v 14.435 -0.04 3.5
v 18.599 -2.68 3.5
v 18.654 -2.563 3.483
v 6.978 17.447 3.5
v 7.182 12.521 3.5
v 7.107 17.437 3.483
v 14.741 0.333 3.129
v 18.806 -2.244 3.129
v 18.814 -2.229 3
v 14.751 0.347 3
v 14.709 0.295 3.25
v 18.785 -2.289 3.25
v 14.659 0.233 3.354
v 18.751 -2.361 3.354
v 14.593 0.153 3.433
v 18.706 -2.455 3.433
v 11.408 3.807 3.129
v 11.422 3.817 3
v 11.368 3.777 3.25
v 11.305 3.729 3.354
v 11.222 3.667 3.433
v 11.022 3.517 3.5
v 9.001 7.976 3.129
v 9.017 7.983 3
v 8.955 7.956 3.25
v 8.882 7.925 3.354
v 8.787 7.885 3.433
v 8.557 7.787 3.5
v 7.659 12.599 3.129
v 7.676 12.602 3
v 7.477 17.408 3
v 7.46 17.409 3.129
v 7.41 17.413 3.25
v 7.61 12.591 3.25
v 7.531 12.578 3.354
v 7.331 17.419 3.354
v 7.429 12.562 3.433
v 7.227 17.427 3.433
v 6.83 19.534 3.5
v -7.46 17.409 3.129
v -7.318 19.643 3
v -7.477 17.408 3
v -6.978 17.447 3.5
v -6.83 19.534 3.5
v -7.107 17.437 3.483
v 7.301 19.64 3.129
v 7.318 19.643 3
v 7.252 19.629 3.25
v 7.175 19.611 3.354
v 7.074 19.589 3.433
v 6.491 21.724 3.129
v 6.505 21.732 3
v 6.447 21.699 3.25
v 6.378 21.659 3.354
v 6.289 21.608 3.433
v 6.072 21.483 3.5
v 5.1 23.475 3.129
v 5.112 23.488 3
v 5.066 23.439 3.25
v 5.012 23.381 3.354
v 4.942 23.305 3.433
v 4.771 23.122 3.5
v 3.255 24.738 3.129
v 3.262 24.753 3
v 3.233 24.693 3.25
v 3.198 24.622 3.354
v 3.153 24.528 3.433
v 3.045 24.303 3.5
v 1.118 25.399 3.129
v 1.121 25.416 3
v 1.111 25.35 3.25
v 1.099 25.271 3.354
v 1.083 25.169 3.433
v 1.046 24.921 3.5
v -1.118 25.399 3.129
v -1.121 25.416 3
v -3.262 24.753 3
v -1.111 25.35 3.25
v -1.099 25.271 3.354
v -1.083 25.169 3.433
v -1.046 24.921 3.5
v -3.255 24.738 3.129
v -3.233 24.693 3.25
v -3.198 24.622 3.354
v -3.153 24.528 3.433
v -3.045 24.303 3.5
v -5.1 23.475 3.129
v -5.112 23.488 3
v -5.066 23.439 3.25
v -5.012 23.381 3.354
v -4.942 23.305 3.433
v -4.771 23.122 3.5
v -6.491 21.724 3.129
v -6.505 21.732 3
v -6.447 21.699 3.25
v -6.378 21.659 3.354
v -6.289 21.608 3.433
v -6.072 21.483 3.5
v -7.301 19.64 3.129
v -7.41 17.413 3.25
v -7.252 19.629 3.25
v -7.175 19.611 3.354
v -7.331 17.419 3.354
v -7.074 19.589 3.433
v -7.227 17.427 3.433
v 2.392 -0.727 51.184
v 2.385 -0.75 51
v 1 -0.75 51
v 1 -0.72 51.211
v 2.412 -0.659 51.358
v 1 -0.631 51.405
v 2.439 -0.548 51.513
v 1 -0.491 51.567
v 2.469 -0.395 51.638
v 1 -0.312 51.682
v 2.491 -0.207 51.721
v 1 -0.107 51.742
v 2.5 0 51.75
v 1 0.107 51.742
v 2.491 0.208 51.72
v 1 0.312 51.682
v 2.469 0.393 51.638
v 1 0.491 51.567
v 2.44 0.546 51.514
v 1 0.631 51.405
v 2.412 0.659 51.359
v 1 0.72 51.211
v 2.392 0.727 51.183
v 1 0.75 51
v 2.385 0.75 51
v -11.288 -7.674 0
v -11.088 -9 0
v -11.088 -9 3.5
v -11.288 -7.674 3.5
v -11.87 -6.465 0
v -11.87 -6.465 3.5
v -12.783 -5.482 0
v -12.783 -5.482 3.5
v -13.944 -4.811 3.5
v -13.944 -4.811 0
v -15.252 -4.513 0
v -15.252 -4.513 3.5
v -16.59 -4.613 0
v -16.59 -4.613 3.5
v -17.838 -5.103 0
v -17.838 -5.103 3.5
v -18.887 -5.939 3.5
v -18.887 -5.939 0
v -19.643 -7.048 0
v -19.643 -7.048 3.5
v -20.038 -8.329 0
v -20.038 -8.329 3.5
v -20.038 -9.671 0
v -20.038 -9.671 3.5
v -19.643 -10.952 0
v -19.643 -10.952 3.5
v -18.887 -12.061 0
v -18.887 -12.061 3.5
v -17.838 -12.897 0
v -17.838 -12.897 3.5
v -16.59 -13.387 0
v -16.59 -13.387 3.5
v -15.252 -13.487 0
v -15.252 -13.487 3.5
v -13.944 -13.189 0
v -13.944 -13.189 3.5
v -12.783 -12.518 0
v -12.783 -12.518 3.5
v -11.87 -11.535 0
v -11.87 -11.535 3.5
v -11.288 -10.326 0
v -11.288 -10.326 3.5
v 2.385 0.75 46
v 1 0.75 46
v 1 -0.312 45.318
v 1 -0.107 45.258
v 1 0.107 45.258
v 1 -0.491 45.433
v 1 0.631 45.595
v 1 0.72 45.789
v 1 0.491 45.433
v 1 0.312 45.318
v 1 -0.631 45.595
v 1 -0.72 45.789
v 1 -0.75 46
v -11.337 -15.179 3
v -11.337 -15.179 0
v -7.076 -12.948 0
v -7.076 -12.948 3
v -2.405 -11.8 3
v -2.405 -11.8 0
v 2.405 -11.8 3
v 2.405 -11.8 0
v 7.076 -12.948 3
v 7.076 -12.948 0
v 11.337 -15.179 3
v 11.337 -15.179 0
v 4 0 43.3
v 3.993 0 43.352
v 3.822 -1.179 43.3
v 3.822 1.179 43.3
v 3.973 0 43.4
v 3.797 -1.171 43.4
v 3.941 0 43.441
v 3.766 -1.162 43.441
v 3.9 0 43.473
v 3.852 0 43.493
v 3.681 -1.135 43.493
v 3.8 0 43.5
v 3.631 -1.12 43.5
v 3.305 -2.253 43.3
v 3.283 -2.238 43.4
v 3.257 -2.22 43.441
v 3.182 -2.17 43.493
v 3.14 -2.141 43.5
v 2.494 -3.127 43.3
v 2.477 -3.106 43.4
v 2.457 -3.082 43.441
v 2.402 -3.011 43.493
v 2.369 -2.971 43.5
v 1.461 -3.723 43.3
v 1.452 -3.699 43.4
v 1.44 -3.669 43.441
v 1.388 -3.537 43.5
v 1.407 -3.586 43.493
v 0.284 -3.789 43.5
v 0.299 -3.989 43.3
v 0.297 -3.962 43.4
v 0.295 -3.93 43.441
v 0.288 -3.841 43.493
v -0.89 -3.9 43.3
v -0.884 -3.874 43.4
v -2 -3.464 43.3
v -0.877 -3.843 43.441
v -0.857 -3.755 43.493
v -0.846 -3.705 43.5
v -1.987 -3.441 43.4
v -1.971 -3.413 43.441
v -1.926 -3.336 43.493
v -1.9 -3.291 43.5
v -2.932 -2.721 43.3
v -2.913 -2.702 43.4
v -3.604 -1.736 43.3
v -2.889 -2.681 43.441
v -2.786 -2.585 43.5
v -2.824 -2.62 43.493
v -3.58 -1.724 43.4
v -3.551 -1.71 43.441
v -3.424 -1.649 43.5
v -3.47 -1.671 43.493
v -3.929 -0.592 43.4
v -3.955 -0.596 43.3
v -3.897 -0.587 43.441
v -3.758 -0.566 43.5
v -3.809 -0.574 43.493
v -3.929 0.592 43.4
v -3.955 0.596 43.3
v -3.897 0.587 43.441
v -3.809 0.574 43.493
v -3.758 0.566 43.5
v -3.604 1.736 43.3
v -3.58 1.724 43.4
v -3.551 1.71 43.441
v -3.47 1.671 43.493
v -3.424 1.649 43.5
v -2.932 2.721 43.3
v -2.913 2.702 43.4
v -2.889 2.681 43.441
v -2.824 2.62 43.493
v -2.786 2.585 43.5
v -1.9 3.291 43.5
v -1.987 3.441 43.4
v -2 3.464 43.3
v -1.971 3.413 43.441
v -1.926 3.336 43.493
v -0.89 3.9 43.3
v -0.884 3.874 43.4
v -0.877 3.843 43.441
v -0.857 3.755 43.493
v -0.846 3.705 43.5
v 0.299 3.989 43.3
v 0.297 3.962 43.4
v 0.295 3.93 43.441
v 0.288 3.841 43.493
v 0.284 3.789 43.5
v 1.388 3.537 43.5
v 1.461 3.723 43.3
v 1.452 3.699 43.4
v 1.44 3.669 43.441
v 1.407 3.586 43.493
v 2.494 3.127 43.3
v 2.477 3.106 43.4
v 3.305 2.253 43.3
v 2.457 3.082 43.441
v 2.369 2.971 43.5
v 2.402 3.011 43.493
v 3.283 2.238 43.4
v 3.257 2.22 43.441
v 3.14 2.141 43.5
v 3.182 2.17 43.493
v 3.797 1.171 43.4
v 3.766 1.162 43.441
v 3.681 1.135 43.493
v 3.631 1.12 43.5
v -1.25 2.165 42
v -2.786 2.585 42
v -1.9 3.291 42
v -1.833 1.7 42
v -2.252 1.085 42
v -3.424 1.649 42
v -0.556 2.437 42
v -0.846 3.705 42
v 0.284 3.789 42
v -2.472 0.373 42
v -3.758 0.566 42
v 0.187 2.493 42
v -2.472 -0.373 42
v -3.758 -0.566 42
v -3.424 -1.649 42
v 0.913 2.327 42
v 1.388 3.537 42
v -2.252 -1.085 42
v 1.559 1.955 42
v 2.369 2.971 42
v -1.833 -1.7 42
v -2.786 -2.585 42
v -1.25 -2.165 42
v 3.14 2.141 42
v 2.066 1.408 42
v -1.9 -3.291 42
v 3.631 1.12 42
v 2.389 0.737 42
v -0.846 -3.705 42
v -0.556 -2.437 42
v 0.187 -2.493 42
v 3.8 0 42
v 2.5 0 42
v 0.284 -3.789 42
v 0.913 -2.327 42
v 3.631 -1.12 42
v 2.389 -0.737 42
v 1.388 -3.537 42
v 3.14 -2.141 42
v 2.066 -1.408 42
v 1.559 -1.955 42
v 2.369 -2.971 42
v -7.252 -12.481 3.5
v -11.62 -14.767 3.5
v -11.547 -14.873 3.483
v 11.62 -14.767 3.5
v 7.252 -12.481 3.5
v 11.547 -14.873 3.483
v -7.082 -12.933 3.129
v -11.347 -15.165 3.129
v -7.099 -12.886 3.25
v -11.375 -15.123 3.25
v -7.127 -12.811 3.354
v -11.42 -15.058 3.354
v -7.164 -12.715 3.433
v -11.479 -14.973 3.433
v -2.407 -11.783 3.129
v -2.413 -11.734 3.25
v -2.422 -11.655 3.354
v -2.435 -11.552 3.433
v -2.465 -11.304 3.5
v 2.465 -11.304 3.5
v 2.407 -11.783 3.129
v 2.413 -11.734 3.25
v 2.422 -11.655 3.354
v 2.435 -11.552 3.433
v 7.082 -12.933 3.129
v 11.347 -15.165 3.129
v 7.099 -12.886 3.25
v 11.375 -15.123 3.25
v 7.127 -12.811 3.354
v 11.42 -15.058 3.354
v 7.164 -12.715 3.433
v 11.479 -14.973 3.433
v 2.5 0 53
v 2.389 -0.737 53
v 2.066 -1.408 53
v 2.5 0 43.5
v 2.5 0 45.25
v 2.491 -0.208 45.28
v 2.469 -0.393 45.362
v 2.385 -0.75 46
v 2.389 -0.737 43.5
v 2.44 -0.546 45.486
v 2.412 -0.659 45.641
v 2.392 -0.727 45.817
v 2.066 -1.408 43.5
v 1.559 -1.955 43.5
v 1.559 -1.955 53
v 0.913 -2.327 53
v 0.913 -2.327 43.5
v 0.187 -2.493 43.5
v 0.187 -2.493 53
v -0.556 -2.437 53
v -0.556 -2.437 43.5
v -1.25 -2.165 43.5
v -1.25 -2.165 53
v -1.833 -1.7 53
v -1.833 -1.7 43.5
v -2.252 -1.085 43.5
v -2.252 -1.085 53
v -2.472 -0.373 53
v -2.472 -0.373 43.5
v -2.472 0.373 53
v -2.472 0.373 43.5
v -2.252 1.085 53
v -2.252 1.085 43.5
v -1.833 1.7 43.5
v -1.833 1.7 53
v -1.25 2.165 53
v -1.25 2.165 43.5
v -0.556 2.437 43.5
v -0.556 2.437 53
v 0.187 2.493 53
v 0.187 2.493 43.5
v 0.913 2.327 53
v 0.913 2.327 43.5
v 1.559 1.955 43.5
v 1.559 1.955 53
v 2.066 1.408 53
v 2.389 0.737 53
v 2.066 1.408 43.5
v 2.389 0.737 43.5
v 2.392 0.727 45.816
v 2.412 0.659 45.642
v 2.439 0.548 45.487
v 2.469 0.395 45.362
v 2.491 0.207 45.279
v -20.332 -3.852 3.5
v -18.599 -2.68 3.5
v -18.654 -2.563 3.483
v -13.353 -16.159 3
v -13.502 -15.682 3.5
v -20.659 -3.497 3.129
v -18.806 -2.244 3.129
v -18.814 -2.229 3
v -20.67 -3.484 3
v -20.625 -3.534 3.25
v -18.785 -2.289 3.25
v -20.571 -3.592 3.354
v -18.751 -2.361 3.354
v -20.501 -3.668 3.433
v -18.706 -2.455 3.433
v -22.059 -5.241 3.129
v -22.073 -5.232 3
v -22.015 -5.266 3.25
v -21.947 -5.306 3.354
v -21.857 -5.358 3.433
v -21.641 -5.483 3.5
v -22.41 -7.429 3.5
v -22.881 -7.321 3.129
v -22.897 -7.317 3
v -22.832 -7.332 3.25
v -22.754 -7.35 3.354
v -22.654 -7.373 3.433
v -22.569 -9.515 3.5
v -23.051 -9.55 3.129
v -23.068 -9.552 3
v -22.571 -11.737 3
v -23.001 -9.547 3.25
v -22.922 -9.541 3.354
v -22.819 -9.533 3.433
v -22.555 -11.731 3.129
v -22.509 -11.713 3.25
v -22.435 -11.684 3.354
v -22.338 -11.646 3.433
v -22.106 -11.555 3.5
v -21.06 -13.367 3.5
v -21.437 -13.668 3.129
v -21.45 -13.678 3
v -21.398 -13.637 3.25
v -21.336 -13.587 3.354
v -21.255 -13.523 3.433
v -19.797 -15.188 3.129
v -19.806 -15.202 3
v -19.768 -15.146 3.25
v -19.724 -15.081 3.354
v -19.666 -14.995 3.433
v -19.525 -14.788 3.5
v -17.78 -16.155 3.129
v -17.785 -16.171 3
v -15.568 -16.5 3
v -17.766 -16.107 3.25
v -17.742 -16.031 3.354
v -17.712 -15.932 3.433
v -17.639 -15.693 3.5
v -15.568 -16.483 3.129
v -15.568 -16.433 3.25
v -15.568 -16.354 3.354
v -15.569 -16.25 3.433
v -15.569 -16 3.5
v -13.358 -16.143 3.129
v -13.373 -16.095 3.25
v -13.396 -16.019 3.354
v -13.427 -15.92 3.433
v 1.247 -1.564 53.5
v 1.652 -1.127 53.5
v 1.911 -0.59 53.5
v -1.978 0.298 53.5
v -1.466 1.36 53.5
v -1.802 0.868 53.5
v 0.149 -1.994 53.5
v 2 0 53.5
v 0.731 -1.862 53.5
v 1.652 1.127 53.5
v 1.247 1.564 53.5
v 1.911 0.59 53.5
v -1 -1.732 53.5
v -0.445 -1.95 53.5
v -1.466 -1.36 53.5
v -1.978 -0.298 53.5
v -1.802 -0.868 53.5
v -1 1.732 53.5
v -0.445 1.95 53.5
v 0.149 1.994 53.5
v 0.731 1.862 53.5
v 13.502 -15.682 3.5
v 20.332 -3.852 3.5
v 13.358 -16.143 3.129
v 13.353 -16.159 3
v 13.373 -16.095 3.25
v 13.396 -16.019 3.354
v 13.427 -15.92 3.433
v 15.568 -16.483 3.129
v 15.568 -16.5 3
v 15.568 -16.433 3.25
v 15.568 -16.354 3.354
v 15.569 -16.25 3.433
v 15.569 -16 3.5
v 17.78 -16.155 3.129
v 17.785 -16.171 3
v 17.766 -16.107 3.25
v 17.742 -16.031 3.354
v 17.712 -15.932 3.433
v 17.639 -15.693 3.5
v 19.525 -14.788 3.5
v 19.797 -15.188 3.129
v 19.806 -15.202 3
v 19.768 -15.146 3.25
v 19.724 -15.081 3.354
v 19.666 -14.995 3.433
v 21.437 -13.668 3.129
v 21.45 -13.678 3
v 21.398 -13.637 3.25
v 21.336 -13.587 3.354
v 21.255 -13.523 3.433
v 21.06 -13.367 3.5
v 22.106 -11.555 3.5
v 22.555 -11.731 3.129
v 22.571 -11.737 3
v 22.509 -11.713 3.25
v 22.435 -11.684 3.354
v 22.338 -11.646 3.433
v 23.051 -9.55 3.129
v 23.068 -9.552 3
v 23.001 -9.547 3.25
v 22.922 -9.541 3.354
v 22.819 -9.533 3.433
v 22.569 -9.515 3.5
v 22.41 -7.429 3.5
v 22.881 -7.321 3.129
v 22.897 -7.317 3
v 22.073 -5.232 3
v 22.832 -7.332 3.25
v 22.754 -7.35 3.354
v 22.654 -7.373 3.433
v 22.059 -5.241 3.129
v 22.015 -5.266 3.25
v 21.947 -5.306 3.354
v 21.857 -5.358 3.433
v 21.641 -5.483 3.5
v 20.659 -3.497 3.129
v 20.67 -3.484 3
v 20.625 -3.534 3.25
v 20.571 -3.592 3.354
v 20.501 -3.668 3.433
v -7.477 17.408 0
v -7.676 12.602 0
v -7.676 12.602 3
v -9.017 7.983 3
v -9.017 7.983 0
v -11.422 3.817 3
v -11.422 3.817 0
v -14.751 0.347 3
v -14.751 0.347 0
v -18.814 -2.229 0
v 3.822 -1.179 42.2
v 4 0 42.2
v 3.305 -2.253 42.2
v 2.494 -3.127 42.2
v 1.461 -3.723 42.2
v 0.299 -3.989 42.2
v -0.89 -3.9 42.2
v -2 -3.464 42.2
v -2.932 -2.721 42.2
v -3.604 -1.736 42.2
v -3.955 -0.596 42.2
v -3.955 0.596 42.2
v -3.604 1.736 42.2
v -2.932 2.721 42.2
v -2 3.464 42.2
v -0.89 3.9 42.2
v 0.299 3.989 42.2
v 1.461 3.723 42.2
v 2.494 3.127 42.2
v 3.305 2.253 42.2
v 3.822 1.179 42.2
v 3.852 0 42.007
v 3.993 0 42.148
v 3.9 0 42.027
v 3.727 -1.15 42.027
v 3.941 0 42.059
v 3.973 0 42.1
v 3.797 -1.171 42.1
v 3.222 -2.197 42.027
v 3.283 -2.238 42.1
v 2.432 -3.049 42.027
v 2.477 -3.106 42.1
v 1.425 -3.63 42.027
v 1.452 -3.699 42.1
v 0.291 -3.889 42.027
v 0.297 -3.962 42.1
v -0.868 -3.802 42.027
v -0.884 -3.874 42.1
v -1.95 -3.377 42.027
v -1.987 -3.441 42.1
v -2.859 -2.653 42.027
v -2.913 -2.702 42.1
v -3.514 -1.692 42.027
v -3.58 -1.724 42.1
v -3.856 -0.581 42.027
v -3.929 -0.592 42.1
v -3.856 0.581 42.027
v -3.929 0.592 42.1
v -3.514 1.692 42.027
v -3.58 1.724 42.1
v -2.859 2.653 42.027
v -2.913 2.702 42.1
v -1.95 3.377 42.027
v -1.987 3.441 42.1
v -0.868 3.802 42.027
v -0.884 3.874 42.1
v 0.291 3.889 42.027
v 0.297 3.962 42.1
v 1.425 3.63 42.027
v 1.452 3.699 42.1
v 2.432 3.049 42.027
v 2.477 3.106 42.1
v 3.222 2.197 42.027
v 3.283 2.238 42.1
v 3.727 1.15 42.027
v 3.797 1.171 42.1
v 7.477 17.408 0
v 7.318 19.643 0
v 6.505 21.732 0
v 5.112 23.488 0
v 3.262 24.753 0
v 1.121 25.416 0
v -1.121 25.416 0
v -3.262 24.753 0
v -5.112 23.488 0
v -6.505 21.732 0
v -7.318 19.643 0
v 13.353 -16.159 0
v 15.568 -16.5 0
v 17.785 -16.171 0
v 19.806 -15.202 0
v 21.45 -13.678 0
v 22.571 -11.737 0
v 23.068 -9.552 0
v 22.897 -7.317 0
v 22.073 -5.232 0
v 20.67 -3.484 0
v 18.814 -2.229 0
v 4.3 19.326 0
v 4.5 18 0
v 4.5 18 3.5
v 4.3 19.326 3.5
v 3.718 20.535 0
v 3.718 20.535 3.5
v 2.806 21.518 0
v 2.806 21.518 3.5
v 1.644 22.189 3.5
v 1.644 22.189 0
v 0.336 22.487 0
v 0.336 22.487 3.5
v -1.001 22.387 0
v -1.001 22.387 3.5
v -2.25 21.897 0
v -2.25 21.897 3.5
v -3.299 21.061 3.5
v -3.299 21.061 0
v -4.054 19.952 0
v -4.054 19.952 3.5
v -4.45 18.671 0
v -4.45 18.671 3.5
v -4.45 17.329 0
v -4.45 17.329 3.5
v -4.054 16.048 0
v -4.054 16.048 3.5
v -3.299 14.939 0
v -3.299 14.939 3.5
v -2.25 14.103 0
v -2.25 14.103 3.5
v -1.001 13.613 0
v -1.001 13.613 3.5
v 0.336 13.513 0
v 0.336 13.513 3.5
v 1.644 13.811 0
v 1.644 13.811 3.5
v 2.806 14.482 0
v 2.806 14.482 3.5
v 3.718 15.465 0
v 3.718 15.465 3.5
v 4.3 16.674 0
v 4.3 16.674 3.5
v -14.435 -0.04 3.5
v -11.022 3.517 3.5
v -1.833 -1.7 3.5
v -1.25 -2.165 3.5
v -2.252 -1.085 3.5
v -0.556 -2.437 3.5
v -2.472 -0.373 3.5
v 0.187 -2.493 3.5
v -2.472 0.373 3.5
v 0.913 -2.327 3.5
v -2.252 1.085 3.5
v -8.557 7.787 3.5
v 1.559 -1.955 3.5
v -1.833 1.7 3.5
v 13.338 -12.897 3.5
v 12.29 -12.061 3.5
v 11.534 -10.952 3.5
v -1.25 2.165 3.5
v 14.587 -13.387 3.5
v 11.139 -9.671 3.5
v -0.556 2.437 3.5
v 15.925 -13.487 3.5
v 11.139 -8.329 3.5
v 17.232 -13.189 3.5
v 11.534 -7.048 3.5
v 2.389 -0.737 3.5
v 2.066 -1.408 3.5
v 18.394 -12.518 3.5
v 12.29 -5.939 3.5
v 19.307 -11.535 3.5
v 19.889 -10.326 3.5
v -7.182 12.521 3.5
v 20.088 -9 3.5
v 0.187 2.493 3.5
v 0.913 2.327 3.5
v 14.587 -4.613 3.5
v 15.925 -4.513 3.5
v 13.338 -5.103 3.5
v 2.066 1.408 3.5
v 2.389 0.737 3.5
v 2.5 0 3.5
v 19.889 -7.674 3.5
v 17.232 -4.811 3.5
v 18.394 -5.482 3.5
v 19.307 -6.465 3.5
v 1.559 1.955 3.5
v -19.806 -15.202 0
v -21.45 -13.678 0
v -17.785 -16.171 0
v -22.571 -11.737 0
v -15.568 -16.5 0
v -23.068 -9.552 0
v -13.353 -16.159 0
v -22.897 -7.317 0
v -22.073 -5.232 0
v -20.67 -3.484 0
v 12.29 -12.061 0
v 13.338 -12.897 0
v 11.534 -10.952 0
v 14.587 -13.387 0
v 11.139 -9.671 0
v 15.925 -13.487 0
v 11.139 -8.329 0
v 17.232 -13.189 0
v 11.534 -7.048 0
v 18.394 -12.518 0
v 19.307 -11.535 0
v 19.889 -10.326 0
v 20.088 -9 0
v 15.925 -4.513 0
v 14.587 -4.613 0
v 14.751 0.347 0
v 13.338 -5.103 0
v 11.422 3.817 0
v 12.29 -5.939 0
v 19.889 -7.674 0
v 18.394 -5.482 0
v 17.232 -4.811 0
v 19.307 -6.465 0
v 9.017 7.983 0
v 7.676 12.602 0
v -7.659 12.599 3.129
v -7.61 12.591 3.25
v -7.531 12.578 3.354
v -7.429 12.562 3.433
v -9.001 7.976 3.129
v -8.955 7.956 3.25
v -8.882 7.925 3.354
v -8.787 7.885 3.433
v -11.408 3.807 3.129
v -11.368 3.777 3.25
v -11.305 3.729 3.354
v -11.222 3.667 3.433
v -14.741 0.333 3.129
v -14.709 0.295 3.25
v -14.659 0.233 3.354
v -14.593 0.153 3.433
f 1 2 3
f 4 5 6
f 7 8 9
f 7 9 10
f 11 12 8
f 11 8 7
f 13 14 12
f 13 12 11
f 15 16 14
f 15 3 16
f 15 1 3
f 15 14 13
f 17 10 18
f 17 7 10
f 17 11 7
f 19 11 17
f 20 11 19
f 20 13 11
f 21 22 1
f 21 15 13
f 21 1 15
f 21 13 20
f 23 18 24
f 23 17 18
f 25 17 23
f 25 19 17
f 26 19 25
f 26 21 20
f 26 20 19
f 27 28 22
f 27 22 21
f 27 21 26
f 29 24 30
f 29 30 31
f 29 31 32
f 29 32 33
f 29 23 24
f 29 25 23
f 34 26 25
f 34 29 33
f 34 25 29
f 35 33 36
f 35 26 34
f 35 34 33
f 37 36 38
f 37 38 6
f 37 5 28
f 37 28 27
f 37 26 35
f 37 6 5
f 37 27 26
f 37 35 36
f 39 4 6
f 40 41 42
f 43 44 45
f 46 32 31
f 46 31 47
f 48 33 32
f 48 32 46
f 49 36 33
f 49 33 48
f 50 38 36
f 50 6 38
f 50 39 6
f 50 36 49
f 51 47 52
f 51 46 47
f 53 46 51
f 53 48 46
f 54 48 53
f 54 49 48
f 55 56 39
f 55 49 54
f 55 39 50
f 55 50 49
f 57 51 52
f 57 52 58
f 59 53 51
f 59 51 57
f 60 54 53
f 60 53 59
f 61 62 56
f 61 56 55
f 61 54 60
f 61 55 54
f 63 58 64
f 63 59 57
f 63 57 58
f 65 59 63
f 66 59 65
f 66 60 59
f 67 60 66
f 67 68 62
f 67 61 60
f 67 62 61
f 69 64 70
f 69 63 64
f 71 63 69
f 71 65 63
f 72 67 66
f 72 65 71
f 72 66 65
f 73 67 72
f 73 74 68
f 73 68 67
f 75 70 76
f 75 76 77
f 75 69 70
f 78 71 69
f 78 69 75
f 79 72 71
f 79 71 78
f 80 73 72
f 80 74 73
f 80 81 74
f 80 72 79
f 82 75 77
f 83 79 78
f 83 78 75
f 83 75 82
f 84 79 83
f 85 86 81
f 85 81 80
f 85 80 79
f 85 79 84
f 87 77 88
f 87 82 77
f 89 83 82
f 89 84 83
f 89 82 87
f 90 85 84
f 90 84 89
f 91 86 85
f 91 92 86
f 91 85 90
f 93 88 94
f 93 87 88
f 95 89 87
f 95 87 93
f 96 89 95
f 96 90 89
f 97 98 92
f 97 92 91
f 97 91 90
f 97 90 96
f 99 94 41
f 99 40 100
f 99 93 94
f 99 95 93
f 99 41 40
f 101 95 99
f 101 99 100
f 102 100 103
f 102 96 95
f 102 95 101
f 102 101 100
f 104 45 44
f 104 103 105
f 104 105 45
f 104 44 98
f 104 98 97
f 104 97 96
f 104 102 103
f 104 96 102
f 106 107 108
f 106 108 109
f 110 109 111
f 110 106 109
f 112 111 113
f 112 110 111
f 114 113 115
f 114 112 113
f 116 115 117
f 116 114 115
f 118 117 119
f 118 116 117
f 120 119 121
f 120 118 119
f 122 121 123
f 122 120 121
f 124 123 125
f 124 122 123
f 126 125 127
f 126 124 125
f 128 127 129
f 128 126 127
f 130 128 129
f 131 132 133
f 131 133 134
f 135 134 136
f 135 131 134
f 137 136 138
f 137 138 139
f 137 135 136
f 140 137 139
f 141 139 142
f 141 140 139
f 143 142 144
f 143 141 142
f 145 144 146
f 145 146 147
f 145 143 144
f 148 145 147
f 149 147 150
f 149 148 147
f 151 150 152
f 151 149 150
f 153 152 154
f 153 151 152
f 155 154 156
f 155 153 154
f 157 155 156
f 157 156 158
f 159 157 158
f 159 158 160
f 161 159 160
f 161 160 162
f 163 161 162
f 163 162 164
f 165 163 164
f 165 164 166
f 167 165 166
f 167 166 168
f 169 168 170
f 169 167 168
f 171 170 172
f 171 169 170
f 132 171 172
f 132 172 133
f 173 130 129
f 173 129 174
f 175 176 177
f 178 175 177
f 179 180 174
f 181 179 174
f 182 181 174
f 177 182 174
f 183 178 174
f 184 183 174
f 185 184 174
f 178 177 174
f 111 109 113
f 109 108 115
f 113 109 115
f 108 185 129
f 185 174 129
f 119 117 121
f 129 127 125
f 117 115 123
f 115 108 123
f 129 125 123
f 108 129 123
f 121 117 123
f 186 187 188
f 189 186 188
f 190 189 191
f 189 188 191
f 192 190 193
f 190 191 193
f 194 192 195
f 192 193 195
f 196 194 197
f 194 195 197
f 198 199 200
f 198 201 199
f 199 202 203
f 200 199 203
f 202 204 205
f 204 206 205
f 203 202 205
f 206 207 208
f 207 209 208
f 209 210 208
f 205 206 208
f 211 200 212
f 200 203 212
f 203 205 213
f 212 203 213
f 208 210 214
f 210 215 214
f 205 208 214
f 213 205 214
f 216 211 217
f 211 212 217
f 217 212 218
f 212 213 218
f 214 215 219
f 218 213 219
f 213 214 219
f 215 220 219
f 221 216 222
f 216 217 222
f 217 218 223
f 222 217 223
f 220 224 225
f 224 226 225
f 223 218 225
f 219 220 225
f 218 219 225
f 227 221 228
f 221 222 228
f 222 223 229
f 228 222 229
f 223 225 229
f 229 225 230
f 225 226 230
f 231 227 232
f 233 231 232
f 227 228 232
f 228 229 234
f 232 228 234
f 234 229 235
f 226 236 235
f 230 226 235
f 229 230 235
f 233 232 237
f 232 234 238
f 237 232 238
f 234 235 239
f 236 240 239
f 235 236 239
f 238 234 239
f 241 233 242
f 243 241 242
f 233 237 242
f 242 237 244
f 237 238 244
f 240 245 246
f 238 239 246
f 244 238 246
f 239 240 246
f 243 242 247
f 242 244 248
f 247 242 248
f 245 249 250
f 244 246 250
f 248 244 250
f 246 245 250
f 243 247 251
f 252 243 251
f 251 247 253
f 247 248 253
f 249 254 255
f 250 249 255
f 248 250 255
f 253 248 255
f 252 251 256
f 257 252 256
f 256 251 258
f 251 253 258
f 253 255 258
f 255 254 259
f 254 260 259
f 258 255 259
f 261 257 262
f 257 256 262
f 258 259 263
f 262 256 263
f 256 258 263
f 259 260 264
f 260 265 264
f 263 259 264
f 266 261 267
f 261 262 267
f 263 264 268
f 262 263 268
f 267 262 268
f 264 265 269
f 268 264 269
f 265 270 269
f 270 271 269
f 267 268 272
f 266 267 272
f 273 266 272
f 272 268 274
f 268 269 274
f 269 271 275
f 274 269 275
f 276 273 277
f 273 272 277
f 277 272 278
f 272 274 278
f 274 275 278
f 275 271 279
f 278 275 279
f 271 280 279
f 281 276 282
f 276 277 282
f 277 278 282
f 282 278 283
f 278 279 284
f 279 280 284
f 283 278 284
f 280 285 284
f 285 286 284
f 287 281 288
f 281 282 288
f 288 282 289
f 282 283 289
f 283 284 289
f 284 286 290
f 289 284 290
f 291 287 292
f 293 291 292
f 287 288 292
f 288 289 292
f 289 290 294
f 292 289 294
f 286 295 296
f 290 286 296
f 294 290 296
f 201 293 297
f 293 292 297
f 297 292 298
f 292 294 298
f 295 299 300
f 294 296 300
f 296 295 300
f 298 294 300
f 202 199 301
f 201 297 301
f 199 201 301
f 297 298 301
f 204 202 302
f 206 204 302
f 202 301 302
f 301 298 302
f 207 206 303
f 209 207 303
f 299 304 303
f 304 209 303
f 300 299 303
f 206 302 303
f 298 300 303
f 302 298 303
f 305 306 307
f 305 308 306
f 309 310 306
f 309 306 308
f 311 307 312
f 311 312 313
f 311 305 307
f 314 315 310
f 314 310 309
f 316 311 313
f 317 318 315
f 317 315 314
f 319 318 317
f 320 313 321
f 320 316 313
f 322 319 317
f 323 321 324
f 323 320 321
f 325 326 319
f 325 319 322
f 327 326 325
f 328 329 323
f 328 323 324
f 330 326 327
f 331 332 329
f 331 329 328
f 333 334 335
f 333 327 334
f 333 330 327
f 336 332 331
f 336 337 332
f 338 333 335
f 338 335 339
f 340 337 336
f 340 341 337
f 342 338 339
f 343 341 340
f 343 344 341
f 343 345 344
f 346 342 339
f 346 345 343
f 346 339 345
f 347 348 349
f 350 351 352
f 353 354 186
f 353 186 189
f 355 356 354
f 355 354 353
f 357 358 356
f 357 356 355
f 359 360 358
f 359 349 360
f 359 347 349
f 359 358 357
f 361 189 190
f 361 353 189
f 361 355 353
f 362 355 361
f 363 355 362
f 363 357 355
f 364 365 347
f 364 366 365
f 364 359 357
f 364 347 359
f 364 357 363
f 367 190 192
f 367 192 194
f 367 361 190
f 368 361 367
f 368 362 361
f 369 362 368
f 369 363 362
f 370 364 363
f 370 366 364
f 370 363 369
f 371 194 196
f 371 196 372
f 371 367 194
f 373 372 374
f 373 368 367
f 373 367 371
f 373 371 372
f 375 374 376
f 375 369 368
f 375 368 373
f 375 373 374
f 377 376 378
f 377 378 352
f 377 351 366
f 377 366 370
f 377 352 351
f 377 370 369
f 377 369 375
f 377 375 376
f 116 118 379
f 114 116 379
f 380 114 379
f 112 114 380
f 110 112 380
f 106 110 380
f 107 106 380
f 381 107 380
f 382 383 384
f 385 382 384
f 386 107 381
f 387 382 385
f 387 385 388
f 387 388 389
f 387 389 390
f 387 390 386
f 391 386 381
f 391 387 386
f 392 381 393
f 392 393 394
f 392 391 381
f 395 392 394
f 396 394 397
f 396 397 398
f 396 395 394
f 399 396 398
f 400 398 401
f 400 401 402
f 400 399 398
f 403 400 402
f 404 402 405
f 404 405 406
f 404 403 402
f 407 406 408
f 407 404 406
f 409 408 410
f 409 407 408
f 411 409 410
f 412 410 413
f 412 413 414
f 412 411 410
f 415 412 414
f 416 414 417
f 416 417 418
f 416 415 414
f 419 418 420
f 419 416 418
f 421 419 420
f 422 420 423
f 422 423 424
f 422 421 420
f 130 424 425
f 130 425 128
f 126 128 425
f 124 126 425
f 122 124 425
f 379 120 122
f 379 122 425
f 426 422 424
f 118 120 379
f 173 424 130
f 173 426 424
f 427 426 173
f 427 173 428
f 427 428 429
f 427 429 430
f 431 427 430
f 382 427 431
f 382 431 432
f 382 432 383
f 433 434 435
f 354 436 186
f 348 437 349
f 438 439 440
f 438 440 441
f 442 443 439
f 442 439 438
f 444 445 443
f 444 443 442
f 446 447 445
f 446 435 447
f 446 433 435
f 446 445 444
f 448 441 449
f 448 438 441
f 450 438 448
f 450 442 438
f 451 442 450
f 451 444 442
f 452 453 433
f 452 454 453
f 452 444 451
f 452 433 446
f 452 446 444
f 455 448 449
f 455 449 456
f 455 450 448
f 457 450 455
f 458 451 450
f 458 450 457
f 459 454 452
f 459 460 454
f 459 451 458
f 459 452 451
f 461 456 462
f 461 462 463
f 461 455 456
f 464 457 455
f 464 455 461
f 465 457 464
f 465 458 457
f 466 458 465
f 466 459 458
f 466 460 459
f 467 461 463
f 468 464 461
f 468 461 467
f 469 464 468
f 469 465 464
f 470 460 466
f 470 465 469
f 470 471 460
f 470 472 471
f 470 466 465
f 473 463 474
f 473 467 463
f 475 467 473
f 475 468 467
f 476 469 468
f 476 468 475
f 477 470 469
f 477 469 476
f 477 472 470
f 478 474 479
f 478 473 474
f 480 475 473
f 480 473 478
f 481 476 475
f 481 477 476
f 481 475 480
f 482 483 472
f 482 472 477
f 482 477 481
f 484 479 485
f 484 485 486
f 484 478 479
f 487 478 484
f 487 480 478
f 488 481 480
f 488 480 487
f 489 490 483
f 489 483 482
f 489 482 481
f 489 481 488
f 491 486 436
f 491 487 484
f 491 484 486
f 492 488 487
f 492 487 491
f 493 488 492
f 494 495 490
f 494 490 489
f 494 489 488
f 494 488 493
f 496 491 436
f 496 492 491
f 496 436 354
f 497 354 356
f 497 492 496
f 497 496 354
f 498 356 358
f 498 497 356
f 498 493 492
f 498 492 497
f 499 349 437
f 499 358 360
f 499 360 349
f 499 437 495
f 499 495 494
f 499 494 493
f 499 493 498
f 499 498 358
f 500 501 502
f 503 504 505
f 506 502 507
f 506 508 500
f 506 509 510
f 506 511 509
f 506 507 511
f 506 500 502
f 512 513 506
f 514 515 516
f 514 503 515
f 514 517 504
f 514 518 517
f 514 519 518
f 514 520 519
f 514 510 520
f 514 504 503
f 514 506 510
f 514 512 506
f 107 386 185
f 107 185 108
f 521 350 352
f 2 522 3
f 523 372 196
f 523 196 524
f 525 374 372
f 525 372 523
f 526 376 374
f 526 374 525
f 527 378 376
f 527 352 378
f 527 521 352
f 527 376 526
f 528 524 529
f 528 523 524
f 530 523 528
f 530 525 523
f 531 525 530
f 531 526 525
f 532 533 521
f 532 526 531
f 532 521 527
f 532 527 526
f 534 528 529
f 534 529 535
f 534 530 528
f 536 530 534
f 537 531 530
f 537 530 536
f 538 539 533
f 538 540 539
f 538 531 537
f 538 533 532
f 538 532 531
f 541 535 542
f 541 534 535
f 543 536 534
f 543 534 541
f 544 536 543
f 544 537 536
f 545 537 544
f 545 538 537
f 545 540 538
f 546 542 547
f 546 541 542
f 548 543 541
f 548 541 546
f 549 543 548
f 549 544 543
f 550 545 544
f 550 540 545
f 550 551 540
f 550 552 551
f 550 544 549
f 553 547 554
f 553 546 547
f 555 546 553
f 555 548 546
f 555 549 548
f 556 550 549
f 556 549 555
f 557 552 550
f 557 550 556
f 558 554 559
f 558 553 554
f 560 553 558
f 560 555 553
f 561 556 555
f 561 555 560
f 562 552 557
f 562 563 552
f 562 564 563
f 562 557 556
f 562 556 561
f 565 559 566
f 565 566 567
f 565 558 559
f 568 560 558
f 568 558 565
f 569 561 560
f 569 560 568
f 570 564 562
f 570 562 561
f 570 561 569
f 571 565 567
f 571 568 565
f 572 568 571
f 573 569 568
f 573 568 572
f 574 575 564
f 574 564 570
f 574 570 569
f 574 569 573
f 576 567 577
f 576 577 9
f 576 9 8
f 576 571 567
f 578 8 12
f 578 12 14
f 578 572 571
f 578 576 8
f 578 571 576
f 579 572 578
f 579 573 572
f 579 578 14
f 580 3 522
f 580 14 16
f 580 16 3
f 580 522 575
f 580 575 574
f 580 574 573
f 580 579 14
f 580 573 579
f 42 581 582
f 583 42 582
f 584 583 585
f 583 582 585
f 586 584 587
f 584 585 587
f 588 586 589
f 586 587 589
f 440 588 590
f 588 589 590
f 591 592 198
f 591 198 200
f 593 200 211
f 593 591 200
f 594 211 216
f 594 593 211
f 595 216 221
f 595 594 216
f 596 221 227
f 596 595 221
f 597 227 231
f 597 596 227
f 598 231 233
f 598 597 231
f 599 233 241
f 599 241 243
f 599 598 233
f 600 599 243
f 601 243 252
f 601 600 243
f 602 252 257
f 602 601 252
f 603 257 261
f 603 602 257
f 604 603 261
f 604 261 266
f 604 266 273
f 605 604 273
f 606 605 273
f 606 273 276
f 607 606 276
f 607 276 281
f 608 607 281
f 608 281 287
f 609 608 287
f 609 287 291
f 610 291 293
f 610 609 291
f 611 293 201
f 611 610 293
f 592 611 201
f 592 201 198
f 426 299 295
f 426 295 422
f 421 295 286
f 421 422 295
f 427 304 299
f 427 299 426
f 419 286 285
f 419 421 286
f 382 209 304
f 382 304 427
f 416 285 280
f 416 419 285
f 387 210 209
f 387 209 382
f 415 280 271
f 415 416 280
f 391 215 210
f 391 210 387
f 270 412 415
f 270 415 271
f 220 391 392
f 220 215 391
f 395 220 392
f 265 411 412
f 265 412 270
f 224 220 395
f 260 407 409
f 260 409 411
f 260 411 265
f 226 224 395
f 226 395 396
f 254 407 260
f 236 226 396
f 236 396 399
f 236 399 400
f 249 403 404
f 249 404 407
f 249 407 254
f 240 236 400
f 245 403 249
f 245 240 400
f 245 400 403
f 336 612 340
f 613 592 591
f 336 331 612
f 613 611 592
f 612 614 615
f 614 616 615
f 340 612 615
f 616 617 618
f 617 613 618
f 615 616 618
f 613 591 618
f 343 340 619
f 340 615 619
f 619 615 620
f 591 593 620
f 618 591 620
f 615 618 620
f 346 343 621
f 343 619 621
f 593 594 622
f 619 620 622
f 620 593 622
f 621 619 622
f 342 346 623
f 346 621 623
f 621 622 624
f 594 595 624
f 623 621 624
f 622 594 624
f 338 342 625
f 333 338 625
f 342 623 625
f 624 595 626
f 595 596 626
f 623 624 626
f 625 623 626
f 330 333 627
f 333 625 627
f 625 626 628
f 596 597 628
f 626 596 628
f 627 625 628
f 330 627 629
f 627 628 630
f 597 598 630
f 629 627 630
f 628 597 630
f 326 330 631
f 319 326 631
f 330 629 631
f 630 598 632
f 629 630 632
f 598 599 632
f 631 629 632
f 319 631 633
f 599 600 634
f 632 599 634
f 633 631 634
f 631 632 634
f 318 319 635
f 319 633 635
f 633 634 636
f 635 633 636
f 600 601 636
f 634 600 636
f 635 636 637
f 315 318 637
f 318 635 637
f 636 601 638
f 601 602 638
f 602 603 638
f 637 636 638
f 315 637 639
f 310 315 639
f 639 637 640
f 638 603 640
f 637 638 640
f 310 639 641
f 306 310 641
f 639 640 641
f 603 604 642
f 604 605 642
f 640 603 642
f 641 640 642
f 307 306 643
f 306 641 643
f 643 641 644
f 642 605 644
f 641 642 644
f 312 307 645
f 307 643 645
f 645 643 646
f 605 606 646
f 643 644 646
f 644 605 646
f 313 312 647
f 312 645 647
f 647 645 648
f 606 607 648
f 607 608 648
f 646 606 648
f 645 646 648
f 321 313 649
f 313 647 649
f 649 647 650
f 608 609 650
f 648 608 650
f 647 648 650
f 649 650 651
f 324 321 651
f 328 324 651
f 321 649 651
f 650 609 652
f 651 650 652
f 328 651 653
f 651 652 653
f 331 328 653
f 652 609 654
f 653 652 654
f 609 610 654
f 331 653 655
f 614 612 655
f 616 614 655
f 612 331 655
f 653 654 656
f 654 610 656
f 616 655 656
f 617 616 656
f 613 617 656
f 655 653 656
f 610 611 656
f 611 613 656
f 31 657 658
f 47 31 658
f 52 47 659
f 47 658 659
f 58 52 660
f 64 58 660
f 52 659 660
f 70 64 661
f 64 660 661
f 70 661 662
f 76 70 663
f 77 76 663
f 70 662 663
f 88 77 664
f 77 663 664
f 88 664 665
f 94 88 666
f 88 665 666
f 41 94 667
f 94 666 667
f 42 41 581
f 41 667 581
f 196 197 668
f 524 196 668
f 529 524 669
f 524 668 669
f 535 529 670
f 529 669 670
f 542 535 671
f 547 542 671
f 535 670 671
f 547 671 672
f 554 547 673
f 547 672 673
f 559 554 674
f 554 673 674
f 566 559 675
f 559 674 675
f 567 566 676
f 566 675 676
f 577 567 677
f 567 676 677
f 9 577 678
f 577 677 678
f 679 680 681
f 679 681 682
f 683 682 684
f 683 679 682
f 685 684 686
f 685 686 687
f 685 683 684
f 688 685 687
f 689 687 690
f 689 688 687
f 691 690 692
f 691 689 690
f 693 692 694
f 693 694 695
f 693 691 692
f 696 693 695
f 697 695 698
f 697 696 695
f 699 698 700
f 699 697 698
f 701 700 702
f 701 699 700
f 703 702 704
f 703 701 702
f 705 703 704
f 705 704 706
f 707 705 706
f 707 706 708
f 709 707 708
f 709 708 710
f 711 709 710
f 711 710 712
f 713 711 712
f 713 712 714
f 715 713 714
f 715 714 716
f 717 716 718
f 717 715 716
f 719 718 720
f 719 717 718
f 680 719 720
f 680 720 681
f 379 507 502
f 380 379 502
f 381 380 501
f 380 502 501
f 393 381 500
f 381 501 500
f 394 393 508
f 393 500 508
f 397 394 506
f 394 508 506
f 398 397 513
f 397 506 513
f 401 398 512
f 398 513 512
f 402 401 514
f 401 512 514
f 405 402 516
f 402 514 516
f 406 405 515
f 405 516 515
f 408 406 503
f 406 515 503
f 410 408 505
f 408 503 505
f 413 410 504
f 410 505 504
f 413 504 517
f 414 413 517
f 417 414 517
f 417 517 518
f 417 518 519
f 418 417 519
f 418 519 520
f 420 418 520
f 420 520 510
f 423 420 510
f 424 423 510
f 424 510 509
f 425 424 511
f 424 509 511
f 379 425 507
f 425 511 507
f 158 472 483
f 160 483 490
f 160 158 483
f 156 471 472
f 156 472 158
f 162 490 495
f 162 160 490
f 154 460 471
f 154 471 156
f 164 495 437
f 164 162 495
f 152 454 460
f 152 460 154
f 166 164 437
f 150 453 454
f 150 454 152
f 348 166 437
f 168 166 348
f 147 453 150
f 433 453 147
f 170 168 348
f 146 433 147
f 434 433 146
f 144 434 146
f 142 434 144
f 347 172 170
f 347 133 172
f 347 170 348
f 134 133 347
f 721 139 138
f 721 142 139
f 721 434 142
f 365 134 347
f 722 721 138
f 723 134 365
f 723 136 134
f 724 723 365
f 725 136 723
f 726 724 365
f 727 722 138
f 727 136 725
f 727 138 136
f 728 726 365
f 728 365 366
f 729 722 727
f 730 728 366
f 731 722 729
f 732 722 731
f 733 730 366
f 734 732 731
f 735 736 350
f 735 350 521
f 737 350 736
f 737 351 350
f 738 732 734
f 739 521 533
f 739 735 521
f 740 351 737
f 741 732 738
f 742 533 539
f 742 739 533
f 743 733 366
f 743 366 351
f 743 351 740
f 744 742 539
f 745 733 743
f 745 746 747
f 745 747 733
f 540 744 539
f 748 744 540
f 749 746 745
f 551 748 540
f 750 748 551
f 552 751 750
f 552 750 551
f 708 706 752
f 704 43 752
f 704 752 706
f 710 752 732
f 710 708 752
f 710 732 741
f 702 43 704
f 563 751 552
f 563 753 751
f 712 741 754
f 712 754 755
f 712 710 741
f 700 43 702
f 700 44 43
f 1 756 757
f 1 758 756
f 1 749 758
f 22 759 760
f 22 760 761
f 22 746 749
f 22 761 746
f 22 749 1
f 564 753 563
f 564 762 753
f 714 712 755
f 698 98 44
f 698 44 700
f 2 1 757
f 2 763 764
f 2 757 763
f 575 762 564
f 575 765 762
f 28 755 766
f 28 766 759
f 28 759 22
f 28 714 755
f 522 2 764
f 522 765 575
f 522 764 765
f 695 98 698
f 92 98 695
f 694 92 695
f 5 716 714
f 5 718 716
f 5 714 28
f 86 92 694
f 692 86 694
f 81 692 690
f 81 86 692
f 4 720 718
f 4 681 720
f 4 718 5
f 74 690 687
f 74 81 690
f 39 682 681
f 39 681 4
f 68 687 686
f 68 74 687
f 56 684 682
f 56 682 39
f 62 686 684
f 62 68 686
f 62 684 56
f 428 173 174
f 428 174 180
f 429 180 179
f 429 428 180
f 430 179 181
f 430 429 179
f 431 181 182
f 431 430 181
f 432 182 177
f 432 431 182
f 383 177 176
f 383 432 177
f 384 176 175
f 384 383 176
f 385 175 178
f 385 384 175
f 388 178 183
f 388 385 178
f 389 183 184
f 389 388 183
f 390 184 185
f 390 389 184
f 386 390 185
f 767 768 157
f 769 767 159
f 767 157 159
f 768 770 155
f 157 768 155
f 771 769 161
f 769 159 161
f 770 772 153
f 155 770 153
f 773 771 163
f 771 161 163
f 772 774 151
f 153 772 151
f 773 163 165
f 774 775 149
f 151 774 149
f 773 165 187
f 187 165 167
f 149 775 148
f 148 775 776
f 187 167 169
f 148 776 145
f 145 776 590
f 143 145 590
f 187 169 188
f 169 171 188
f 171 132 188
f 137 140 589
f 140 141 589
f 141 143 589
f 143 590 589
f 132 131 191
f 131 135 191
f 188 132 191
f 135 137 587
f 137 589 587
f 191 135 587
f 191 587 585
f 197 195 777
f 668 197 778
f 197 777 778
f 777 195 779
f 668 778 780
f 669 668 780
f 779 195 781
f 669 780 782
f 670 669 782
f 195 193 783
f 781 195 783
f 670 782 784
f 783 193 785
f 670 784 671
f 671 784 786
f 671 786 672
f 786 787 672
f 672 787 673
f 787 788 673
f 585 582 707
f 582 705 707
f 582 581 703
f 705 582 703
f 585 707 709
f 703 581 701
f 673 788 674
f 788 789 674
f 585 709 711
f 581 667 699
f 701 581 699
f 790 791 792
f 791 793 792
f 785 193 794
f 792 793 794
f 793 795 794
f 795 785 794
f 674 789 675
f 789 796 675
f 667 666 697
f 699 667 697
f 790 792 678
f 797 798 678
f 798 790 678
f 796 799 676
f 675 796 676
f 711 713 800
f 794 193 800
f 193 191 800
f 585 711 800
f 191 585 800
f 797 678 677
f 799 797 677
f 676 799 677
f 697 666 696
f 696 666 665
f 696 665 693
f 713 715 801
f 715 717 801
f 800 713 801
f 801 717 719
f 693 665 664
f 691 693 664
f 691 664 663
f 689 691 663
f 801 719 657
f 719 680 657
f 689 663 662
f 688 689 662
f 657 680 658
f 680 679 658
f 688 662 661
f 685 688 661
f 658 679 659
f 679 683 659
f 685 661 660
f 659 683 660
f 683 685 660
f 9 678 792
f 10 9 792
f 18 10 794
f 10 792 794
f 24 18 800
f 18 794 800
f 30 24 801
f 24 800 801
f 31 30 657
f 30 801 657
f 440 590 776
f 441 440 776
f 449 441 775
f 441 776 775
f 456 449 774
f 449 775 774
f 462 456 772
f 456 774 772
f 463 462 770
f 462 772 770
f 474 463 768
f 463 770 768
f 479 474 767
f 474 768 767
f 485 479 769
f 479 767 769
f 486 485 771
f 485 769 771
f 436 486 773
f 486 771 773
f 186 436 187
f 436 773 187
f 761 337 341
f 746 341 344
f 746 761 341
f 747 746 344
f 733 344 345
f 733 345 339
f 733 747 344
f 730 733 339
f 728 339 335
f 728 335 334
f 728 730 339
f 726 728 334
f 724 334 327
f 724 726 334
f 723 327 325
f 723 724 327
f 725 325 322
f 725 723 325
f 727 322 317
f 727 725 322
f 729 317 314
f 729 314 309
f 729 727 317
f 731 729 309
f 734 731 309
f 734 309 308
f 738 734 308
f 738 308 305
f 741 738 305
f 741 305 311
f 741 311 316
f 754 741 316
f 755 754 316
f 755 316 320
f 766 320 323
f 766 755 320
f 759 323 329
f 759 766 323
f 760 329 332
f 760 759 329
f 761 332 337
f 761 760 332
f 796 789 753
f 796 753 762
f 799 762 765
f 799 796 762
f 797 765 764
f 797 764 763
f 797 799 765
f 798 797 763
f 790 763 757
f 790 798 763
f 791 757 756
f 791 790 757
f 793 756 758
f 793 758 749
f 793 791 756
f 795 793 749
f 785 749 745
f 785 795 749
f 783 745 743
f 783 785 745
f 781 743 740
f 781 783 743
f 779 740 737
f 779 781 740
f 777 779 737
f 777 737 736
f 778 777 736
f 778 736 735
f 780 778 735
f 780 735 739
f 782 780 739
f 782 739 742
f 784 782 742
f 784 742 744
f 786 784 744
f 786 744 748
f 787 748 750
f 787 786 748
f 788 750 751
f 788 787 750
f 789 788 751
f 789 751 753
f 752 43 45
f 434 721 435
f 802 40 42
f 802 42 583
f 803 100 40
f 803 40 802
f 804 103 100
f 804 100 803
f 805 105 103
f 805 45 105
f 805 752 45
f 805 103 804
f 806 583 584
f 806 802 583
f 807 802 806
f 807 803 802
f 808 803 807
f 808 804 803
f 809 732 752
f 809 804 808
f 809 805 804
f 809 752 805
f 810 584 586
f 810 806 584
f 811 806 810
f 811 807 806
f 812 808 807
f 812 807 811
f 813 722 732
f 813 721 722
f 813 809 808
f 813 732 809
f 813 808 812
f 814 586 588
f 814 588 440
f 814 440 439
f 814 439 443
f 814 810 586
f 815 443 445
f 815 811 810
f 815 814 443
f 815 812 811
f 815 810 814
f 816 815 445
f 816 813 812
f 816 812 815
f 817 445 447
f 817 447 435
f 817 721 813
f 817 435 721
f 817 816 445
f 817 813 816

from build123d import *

# Parameters (mm, degrees)
SKETCH1_R           = 4.5
BOSS_EXTRUDE1_DEPTH = 3.5
CUT_EXTRUDE1_DEPTH  = 1.5
FILLET1_R           = 0.5
FILLET2_R           = 0.2
CHAMFER1_SIZE       = 0.5


with BuildPart() as part:
    # Sketch1 → Boss-Extrude1 (new body)
    with BuildSketch(Plane.XY):
        with BuildLine():
            ThreePointArc((7.476559852, 17.407502934), (0, 25.5), (-7.476559852, 17.407502934))
            ThreePointArc((-7.476559852, 17.407502934), (-10.093544717, 5.827510759), (-18.813619684, -2.228860702))
            ThreePointArc((-18.813619684, -2.228860702), (-22.083647797, -12.75), (-11.337059831, -15.178642232))
            ThreePointArc((-11.337059831, -15.178642232), (0, -11.655021518), (11.337059831, -15.178642232))
            ThreePointArc((11.337059831, -15.178642232), (22.083647797, -12.75), (18.813619684, -2.228860702))
            ThreePointArc((18.813619684, -2.228860702), (10.093544717, 5.827510759), (7.476559852, 17.407502934))
        make_face()
        with Locations((0, 18)):
            Circle(SKETCH1_R, mode=Mode.SUBTRACT)
        with Locations((15.588457268, -9)):
            Circle(SKETCH1_R, mode=Mode.SUBTRACT)
        with Locations((-15.588457268, -9)):
            Circle(SKETCH1_R, mode=Mode.SUBTRACT)
    extrude(amount=BOSS_EXTRUDE1_DEPTH)

    # Sketch2 → Revolve4 (revolve)
    with BuildSketch(Plane(origin=(0, 0, 0), x_dir=(0, 0, -1), z_dir=(1, 0, 0)), mode=Mode.PRIVATE) as revolve4_sk:
        Polygon((-53.5, 2.5), (-43.5, 2.5), (-43.5, 4), (-42, 4), (-42, 2.5), (-3.5, 2.5), (-3.5, 0), (-53.5, 0), align=None)
    revolve(revolve4_sk.sketch.rotate(Axis((0, 0, 49.596889026), (0, 0, -1)), 90), axis=Axis((0, 0, 49.596889026), (0, 0, -1)))

    # Sketch6 → Cut-Extrude1 (cut)
    with BuildSketch(Plane(origin=(2.5, 0, 0), x_dir=(0, 0, -1), z_dir=(1, 0, 0))):
        with BuildLine():
            Line((-51, 0.75), (-46, 0.75))
            ThreePointArc((-46, 0.75), (-45.25, 0), (-46, -0.75))
            Line((-46, -0.75), (-51, -0.75))
            ThreePointArc((-51, -0.75), (-51.75, 0), (-51, 0.75))
        make_face()
    extrude(amount=-CUT_EXTRUDE1_DEPTH, mode=Mode.SUBTRACT)

    # Fillet1
    fillet1_edges = [part.edges().sort_by_distance(p)[0] for p in [
        (-10.093544717, 5.827510759, 3.5),
        (-22.083647797, -12.75, 3.5),
        (0, -11.655021518, 3.5),
        (22.083647797, -12.75, 3.5),
        (10.093544717, 5.827510759, 3.5),
        (0, 25.5, 3.5),
    ]]
    fillet(fillet1_edges, radius=FILLET1_R)

    # Fillet2
    fillet2_edges = [part.edges().sort_by_distance(p)[0] for p in [
        (-4, 0, 42),
        (-4, 0, 43.5),
    ]]
    fillet(fillet2_edges, radius=FILLET2_R)

    # Chamfer1
    chamfer1_edges = [part.edges().sort_by_distance(p)[0] for p in [
        (-2.5, 0, 53.5),
    ]]
    chamfer(chamfer1_edges, length=CHAMFER1_SIZE)


solid = part.part
